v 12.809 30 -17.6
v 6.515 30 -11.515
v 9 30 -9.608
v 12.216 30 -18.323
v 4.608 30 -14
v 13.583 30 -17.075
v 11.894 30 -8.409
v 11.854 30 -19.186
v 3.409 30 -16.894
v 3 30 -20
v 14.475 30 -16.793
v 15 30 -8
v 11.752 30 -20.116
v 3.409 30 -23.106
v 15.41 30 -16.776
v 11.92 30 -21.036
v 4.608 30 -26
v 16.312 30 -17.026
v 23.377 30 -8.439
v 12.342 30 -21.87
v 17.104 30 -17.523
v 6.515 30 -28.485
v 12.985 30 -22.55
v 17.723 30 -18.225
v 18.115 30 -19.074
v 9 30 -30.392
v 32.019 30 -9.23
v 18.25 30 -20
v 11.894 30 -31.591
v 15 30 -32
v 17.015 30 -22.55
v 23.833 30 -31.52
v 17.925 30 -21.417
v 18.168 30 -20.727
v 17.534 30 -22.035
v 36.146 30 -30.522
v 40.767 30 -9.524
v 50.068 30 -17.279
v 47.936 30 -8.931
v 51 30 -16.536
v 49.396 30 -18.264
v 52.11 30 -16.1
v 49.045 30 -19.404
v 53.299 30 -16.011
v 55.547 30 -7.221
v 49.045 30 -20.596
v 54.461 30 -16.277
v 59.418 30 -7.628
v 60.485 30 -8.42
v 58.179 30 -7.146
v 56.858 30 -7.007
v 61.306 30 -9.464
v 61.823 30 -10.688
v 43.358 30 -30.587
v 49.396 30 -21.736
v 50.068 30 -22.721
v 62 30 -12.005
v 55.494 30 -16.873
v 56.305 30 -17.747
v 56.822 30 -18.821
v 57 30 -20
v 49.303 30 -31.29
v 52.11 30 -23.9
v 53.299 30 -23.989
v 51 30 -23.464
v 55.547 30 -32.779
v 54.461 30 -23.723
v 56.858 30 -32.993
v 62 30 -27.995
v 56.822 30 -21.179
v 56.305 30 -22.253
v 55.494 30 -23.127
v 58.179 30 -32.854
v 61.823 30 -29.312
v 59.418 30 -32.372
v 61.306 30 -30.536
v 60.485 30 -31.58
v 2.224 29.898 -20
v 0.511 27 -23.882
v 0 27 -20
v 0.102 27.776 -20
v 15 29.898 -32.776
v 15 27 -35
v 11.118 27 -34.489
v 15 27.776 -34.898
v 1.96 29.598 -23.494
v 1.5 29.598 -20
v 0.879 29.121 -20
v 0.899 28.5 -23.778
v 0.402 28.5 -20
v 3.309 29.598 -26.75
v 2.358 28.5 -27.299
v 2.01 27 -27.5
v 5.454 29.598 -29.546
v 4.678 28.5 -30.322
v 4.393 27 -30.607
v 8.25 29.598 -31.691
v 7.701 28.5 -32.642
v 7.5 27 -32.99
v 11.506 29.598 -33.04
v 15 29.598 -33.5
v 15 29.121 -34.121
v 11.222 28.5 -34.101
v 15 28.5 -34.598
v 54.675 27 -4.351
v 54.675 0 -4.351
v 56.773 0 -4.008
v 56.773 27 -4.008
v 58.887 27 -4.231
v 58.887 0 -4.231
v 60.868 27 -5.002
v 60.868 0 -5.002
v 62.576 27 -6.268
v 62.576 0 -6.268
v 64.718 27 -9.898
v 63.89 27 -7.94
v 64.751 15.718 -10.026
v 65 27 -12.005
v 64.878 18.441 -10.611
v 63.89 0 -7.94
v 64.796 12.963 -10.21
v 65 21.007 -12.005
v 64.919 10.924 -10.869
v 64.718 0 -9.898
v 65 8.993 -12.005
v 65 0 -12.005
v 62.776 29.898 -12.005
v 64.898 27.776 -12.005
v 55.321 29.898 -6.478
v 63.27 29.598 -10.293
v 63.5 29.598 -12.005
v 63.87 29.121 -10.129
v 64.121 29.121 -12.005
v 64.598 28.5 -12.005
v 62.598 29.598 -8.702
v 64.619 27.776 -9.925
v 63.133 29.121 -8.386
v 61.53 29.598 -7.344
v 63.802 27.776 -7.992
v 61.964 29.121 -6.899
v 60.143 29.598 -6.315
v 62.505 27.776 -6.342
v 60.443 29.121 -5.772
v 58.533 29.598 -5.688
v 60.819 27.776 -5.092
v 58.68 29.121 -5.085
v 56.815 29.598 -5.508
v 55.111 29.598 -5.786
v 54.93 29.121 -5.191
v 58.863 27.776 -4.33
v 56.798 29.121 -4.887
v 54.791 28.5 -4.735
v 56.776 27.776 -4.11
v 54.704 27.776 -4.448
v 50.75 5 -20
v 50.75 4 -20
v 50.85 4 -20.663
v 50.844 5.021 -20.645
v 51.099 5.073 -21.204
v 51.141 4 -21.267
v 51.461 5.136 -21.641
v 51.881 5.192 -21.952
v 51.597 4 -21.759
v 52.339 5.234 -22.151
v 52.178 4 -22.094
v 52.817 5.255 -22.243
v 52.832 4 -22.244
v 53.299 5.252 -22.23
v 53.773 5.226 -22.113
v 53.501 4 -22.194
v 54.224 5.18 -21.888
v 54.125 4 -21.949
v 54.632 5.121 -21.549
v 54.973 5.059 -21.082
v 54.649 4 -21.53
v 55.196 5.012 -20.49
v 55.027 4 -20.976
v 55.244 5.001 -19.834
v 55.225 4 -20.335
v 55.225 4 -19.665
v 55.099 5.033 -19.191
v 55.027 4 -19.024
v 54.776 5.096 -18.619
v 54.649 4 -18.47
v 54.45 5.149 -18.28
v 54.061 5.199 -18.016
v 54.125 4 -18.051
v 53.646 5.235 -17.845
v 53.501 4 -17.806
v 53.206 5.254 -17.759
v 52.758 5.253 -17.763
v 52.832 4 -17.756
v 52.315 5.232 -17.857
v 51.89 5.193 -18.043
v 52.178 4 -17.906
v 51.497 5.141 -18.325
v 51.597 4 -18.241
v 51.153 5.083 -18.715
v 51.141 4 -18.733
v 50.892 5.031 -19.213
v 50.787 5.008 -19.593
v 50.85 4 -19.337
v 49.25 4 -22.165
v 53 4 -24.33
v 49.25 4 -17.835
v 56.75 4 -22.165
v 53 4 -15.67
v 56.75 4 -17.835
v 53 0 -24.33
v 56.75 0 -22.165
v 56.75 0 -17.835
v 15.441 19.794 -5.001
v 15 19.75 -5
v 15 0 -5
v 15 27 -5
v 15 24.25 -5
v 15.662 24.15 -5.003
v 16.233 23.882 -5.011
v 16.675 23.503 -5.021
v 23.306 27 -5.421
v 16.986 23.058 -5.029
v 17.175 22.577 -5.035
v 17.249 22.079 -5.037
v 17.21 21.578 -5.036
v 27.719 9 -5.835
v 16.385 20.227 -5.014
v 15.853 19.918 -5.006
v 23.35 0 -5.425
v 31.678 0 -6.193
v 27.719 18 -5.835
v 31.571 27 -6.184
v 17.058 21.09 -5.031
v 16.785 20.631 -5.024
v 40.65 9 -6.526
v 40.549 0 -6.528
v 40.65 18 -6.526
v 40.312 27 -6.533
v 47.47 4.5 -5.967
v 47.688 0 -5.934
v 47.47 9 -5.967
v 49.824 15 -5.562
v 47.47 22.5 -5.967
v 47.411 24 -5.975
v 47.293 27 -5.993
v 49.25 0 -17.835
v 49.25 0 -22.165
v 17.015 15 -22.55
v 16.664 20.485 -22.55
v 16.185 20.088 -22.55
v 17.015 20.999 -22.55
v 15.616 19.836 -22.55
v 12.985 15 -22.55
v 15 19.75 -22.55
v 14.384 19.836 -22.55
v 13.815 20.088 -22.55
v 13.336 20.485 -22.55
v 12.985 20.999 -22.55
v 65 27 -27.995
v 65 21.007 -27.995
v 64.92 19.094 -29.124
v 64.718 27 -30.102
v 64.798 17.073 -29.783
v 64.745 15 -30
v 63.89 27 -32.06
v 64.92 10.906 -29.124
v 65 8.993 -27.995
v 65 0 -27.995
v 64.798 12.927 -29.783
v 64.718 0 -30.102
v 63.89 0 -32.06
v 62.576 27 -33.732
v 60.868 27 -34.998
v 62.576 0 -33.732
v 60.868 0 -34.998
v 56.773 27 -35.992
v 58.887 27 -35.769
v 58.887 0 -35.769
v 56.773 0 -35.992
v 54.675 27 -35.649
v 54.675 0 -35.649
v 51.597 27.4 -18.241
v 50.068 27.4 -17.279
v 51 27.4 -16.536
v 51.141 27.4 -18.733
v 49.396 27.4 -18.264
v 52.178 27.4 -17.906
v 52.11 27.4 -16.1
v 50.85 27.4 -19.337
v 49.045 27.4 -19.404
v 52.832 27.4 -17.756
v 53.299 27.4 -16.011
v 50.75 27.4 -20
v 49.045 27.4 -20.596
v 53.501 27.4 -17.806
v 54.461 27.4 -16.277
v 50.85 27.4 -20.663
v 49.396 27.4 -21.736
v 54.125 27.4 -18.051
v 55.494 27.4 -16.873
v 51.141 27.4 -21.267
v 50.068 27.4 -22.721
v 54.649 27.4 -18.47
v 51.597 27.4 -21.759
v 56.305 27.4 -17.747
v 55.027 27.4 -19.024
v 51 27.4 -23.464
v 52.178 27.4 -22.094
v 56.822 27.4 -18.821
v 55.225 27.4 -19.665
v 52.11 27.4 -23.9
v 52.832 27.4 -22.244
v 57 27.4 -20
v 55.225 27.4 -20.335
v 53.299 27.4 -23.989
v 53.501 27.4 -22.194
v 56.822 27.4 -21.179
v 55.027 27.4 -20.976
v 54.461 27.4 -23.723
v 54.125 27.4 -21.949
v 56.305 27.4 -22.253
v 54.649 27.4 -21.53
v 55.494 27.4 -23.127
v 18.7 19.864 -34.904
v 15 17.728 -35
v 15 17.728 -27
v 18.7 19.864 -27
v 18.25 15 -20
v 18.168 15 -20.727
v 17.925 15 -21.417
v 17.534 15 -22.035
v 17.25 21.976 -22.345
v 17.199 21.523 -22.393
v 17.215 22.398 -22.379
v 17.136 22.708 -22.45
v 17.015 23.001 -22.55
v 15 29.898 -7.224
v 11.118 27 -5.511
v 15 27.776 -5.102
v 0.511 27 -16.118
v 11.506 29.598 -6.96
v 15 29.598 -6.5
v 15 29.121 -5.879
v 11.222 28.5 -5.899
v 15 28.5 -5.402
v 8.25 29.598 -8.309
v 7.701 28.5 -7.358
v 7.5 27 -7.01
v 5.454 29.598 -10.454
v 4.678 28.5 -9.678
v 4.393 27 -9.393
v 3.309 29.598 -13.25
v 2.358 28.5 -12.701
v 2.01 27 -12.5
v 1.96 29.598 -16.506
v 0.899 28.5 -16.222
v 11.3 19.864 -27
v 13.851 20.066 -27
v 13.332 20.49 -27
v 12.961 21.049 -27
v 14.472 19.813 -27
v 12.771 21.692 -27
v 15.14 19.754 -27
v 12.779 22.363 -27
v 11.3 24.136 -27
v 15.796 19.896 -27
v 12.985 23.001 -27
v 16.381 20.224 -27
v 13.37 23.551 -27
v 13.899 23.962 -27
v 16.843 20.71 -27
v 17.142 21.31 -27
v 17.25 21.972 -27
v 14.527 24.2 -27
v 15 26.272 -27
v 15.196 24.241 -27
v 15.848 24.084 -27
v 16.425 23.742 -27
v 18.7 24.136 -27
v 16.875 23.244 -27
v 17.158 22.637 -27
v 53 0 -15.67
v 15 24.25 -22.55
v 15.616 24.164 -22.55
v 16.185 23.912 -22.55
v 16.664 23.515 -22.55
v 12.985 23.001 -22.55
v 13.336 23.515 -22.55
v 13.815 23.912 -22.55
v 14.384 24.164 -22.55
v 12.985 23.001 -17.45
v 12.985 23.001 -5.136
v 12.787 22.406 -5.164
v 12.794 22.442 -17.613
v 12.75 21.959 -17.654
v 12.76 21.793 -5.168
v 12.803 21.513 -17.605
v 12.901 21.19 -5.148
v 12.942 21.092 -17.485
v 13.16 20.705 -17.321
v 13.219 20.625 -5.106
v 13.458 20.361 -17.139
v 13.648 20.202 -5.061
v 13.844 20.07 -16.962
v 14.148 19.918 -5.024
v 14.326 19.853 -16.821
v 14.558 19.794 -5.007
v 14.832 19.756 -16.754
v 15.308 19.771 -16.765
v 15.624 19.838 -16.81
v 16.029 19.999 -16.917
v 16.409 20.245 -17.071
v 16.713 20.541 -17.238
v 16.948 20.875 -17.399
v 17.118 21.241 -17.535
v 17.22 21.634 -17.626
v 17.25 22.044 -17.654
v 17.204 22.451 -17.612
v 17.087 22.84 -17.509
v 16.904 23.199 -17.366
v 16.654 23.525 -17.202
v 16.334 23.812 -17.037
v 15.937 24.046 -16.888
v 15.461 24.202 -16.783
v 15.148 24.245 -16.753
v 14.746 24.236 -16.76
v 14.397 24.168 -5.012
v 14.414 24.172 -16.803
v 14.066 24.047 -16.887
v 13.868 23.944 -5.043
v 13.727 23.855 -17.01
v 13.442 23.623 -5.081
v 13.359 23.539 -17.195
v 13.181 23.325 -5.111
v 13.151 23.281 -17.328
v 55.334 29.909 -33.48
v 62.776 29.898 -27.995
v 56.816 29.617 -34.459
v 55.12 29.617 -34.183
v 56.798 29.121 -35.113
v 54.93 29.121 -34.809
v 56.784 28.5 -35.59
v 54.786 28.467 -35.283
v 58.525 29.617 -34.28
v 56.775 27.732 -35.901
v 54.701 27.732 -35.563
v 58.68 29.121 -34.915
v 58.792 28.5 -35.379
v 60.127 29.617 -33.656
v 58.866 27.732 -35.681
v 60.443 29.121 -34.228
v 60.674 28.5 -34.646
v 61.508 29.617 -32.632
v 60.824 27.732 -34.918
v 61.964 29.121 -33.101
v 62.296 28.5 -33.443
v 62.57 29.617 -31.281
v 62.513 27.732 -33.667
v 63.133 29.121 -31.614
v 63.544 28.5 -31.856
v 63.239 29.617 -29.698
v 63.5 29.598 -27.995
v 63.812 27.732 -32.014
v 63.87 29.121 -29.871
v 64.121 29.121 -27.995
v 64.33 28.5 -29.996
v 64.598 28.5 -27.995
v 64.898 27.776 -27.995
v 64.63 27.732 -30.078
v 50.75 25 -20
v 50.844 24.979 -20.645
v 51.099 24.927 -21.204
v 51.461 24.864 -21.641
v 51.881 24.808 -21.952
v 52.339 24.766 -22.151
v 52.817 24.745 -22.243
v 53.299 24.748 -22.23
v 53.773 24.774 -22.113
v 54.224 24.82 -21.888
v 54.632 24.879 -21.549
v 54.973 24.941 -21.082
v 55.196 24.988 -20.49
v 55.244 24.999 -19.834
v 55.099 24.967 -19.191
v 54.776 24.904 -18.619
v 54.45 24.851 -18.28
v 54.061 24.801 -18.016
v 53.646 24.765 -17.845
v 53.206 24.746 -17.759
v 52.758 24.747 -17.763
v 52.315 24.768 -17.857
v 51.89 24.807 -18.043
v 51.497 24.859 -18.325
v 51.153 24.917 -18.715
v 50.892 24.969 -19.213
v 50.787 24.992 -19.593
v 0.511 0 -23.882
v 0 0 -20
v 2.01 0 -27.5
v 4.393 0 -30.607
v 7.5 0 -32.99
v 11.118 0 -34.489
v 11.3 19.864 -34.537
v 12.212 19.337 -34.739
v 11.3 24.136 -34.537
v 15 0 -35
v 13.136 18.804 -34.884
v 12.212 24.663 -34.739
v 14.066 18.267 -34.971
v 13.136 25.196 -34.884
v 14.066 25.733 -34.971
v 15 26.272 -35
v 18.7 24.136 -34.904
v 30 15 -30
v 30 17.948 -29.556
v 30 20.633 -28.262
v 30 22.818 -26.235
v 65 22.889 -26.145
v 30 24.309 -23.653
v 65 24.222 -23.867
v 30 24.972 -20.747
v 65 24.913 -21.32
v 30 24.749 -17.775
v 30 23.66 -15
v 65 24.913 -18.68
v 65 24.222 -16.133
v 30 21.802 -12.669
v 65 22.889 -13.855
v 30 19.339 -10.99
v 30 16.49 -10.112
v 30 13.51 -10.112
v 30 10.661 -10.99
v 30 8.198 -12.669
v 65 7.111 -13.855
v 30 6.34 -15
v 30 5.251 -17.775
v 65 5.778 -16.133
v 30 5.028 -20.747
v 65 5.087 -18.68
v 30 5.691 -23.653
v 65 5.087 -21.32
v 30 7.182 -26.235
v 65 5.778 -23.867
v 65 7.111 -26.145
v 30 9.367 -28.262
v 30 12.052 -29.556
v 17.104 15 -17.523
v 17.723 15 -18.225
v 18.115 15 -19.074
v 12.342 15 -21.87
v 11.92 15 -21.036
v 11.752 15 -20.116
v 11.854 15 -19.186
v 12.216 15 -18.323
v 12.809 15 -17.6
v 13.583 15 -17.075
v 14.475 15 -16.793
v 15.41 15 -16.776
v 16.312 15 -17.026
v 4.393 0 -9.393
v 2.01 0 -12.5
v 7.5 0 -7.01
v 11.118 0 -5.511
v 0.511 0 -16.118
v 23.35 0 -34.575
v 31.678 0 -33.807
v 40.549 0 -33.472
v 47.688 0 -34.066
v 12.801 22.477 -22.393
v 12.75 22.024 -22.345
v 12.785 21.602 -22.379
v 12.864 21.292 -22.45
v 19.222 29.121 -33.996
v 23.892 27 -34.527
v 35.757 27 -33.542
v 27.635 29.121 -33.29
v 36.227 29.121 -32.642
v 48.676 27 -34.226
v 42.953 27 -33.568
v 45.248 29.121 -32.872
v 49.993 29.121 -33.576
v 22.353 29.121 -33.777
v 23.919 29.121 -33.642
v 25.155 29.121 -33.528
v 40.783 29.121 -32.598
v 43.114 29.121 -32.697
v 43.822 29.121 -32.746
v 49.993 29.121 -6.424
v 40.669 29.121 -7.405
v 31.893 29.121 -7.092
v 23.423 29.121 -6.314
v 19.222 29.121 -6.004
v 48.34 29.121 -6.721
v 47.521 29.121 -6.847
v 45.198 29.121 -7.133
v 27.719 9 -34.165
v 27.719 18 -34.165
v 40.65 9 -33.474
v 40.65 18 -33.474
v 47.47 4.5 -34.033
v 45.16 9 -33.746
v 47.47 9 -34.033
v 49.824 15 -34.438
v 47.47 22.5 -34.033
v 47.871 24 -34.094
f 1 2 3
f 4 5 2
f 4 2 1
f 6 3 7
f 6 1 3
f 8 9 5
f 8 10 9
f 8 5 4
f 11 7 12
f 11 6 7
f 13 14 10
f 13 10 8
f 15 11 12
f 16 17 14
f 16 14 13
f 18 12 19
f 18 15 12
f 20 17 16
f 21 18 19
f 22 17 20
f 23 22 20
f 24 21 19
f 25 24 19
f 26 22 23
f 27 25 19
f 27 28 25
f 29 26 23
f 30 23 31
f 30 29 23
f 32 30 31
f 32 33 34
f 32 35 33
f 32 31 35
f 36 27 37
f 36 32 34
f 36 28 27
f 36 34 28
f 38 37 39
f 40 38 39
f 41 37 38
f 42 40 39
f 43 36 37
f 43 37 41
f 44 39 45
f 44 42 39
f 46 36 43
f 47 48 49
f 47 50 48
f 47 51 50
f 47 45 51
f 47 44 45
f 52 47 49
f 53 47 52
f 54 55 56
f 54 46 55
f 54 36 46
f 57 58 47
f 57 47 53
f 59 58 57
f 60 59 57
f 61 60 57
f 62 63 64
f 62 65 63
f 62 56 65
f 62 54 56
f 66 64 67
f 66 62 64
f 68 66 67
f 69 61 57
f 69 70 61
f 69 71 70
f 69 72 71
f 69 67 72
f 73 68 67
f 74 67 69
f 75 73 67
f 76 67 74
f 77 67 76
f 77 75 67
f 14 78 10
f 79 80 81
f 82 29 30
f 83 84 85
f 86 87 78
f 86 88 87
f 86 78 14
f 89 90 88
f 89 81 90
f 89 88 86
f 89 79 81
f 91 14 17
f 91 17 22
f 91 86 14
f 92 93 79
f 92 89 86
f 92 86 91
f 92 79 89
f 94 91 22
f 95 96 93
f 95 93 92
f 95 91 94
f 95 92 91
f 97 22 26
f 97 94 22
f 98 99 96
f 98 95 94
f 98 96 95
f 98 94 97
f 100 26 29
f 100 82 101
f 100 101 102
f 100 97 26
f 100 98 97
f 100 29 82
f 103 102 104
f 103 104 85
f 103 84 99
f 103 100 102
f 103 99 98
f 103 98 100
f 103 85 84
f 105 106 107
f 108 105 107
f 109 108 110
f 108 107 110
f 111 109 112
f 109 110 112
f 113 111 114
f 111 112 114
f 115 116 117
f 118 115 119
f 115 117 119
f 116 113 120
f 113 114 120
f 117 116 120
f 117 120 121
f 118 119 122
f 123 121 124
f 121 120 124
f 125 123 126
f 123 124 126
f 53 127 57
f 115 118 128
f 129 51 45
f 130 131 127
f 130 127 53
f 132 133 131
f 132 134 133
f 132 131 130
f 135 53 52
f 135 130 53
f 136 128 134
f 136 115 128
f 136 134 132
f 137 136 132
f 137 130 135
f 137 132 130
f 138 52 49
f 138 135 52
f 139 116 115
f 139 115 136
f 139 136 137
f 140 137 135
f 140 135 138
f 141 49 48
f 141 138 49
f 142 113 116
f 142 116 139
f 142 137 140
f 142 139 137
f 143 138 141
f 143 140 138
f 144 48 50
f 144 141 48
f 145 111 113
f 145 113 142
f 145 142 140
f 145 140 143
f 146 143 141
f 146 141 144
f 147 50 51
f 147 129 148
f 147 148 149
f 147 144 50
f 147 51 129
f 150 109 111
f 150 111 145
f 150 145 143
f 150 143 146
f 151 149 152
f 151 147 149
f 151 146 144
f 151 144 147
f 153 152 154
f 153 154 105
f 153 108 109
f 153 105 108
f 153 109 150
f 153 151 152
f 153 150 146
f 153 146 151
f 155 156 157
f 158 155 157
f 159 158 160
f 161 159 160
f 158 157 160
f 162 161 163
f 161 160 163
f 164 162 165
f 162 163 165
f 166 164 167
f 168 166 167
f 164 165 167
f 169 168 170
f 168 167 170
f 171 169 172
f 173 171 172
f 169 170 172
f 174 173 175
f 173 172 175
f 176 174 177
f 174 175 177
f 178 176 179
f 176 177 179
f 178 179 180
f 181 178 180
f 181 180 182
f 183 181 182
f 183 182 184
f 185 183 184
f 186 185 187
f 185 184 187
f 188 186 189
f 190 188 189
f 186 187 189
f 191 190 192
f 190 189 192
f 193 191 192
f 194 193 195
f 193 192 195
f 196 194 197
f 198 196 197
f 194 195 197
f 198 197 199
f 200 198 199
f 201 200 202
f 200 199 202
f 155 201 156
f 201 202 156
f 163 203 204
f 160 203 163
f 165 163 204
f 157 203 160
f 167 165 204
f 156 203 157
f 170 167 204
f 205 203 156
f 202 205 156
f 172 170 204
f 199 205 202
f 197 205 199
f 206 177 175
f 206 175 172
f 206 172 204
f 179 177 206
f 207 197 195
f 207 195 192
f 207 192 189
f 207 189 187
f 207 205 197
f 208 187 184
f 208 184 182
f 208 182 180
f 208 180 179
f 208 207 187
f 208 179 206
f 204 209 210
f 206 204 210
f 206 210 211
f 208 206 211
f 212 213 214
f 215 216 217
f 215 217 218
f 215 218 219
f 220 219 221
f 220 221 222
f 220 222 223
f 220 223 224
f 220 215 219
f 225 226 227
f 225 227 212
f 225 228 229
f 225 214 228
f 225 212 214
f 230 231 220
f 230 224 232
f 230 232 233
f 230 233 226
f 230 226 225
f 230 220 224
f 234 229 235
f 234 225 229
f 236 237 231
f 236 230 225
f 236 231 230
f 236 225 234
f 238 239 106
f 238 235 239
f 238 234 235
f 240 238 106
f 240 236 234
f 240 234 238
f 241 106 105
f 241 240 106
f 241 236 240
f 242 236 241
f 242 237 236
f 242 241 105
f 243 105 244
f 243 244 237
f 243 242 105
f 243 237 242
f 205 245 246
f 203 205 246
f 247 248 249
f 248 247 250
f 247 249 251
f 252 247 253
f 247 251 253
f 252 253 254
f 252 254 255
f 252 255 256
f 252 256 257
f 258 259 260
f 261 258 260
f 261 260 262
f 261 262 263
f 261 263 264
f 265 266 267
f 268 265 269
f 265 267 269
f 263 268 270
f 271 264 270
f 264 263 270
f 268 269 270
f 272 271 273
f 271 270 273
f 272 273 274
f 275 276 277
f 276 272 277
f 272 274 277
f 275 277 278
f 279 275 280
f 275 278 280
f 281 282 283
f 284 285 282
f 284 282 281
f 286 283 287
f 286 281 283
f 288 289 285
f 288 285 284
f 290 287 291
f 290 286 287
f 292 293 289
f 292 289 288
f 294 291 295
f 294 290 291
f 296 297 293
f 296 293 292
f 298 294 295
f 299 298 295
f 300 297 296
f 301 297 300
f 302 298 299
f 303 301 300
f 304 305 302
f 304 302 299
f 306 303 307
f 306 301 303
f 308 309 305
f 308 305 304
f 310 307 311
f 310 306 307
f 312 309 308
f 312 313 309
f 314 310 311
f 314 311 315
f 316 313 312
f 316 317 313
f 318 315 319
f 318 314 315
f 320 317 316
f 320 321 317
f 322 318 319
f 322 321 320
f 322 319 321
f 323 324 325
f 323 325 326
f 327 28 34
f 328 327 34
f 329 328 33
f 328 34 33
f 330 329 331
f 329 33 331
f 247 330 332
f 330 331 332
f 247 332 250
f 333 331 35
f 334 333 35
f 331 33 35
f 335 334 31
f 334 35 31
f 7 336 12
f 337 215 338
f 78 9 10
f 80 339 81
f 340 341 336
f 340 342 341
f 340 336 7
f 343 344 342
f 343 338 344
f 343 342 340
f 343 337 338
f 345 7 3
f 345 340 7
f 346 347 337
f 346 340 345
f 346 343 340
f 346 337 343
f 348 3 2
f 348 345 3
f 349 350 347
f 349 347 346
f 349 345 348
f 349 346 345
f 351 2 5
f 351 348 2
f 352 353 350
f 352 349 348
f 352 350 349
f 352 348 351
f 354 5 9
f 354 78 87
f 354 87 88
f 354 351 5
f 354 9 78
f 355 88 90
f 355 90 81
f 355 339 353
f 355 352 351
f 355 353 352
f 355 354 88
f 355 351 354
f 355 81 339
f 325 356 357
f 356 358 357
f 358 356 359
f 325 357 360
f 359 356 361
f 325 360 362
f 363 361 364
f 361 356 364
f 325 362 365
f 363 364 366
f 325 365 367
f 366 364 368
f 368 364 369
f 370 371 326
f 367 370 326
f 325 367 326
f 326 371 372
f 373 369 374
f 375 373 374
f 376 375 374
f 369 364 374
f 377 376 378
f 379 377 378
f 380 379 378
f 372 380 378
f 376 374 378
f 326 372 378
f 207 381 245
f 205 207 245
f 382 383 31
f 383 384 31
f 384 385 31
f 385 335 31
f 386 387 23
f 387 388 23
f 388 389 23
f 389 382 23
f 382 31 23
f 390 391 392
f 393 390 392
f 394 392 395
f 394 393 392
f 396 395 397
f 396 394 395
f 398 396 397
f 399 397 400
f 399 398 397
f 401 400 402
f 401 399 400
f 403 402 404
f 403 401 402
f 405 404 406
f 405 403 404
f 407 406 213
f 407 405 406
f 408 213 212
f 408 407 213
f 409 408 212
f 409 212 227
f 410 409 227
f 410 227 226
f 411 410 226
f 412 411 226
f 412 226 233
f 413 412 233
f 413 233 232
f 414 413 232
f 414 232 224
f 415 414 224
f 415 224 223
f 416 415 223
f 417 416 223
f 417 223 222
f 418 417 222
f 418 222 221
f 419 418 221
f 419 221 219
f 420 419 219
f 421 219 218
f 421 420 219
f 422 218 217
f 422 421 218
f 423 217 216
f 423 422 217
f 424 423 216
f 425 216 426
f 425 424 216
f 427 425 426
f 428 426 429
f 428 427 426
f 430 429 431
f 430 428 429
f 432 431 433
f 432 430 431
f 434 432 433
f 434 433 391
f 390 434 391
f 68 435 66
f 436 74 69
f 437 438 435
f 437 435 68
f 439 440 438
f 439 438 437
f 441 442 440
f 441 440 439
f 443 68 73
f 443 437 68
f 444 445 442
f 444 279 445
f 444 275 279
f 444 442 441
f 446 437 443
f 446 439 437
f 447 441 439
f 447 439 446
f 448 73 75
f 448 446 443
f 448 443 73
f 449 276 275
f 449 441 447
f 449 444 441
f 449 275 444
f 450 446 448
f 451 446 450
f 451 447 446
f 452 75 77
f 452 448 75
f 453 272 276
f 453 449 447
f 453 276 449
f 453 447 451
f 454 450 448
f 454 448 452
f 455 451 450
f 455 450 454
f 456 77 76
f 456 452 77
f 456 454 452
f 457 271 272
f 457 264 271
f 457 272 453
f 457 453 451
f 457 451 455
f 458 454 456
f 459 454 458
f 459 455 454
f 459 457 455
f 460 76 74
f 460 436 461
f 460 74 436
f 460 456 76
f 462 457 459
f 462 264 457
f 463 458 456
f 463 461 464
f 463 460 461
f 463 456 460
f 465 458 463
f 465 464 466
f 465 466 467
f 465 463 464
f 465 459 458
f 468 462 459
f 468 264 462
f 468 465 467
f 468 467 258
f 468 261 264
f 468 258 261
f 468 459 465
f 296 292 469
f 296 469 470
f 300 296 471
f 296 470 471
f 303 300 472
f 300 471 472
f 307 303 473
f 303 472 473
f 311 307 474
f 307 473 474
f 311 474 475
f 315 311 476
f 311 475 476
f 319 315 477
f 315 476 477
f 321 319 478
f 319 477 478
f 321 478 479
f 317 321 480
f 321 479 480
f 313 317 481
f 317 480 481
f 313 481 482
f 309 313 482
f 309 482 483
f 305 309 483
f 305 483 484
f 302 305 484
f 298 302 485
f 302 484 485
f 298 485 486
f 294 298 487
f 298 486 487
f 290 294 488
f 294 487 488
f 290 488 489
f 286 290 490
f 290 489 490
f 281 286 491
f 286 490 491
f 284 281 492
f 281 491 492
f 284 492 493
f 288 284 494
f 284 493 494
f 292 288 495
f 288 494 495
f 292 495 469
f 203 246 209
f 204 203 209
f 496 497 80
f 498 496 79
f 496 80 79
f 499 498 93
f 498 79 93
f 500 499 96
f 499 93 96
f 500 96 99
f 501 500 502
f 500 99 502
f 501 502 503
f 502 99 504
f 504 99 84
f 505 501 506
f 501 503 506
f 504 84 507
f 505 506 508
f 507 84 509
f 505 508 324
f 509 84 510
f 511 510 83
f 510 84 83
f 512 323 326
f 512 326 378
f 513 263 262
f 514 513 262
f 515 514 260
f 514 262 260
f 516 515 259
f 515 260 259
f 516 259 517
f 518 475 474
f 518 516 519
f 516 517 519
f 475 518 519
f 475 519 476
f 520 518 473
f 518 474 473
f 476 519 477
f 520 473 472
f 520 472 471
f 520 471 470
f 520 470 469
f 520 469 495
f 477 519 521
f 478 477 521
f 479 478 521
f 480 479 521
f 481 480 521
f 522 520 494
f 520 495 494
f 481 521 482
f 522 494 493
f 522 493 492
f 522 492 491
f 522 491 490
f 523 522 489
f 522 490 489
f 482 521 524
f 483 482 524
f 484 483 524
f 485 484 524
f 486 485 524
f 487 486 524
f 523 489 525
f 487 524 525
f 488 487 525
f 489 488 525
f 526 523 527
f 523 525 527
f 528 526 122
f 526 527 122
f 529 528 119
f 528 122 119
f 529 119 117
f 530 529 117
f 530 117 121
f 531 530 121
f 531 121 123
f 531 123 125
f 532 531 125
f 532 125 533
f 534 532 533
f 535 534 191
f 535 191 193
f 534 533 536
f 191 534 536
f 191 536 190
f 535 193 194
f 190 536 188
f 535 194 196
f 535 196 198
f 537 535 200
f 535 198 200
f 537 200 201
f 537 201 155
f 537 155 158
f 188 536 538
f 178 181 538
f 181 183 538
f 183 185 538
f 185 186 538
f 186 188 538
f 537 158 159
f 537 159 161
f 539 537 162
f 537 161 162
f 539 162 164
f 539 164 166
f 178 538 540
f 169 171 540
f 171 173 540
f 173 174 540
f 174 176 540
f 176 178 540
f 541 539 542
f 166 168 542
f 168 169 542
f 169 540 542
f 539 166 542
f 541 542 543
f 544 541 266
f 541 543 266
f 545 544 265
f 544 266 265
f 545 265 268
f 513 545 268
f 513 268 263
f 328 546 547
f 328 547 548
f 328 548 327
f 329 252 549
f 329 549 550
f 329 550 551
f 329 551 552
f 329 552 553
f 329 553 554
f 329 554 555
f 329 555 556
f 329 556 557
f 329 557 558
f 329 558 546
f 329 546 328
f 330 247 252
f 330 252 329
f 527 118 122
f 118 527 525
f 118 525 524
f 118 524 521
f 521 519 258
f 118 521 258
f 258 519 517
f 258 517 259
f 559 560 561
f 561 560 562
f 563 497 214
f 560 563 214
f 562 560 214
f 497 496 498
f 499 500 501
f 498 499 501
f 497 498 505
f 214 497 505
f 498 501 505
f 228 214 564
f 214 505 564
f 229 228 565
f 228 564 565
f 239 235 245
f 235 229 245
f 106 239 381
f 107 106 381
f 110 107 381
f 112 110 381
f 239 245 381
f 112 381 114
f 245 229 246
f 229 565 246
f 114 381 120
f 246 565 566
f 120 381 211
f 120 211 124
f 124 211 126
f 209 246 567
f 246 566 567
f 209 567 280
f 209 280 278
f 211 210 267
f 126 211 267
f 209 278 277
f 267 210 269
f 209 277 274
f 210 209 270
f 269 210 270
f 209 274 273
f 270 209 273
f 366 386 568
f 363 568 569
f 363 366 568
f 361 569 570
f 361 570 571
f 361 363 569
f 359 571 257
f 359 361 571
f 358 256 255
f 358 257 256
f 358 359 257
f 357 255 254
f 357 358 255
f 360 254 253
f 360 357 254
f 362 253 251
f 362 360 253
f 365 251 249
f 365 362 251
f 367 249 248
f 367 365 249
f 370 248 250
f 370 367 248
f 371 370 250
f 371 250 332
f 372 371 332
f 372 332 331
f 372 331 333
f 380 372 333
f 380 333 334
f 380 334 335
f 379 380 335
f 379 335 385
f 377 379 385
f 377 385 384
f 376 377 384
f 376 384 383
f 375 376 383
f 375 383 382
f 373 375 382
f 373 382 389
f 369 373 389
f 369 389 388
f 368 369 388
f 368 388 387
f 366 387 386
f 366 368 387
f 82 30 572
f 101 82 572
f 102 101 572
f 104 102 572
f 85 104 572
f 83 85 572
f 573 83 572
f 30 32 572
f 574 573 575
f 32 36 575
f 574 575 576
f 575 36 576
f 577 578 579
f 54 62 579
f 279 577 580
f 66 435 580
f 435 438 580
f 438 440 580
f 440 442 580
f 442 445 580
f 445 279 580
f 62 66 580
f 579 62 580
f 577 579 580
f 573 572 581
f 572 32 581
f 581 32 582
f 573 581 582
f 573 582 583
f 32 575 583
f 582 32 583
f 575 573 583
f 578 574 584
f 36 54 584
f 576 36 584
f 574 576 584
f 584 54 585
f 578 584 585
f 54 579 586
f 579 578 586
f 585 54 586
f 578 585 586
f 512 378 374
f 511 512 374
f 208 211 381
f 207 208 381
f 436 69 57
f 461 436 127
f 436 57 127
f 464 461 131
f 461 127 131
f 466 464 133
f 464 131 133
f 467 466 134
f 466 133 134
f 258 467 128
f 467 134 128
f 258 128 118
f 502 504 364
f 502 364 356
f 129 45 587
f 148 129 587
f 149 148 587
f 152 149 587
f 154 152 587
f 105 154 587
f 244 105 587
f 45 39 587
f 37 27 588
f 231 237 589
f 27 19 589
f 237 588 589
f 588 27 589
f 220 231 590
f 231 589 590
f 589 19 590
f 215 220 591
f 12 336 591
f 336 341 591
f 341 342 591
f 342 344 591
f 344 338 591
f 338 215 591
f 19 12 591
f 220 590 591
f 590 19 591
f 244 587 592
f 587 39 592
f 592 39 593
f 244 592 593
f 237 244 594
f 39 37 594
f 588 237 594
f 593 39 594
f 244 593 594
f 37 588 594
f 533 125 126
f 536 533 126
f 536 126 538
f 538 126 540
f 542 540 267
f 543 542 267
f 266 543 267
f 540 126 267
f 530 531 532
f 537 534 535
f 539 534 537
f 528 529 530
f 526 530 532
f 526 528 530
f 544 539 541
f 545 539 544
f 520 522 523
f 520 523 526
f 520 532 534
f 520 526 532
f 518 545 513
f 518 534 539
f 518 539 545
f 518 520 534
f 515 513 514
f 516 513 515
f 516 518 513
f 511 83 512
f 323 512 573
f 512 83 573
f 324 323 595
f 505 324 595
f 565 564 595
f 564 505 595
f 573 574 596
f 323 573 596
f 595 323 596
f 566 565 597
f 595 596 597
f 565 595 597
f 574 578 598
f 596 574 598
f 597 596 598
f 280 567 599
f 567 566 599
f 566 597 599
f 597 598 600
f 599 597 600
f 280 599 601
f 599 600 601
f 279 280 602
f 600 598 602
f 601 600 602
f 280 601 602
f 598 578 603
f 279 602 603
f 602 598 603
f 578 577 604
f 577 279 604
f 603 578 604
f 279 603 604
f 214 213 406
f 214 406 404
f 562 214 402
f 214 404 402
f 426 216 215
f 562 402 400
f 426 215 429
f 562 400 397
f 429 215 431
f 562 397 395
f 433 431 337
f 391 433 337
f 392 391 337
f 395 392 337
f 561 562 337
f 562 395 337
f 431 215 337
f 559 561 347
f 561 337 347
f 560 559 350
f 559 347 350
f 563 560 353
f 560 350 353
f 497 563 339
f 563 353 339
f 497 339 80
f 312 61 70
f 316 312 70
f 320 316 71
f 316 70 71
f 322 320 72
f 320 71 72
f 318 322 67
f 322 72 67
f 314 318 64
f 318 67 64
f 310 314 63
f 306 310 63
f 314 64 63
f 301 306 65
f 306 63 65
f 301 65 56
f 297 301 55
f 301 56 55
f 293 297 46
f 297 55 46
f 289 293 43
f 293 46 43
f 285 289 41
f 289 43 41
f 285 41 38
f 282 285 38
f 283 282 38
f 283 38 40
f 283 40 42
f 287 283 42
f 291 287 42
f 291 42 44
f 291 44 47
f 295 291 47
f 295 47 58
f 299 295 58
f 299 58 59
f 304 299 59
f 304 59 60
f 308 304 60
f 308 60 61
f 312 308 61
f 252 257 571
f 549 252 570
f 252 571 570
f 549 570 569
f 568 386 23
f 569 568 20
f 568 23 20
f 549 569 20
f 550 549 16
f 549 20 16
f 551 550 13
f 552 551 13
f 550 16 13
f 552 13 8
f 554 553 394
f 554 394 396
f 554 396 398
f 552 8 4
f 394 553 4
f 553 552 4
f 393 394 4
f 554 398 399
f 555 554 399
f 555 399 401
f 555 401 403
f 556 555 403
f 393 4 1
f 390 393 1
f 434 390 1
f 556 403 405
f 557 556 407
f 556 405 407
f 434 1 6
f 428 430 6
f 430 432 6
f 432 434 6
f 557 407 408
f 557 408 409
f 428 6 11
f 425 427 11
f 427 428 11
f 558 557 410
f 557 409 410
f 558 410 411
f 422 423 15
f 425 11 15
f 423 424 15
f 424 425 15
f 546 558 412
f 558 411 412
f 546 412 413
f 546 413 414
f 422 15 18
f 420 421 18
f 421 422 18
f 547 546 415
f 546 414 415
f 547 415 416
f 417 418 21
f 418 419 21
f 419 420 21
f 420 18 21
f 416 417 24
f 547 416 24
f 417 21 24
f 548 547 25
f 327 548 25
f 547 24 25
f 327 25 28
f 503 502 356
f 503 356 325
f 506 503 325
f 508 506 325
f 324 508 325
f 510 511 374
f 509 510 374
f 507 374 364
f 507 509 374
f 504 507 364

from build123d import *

# Parameters (mm, degrees)
SKETCH1_W                                   = 65
SKETCH1_H                                   = 40
BOSS_EXTRUDE1_DEPTH                         = 30
SKETCH3_R                                   = 10
CUT_EXTRUDE2_DEPTH                          = 35
CBORE_FOR_M4_CHEESE_HEAD_SCREW1_D           = 4.5
CBORE_FOR_M4_CHEESE_HEAD_SCREW1_CBORE_D     = 8
CBORE_FOR_M4_CHEESE_HEAD_SCREW1_CBORE_DEPTH = 2.6
SKETCH10_R                                  = 2.25
CUT_EXTRUDE8_DEPTH                          = 4
CUT_EXTRUDE9_DEPTH                          = 15
CUT_EXTRUDE10_DEPTH                         = 83.006097414
FILLET9_R                                   = 8
SKETCH12_R                                  = 2.25
CUT_EXTRUDE11_DEPTH                         = 8
SKETCH12_3_R                                = 2.25
CUT_EXTRUDE12_DEPTH                         = 79.010807554
FILLET10_R                                  = 3


with BuildPart() as part:
    # Sketch1 → Boss-Extrude1 (new body)
    with BuildSketch(Plane(origin=(0, 0, 0), x_dir=(1, 0, 0), z_dir=(0, 1, 0))):
        with Locations((32.5, 20)):
            Rectangle(SKETCH1_W, SKETCH1_H)
    extrude(amount=BOSS_EXTRUDE1_DEPTH)

    # Sketch3 → Cut-Extrude2 (cut)
    with BuildSketch(Plane(origin=(65, 0, 0), x_dir=(0, 0, -1), z_dir=(1, 0, 0))):
        with Locations((20, 15)):
            Circle(SKETCH3_R)
    extrude(amount=-CUT_EXTRUDE2_DEPTH, mode=Mode.SUBTRACT)

    # CBORE for M4 Cheese Head Screw1 (through all)
    with Locations(Plane(origin=(0, 30, 0), x_dir=(1, 0, 0), z_dir=(0, 1, 0))):
        with Locations((53, 20)):
            CounterBoreHole(CBORE_FOR_M4_CHEESE_HEAD_SCREW1_D / 2, CBORE_FOR_M4_CHEESE_HEAD_SCREW1_CBORE_D / 2, CBORE_FOR_M4_CHEESE_HEAD_SCREW1_CBORE_DEPTH)

    # Sketch10 → Cut-Extrude8 (cut)
    with BuildSketch(Plane.XZ):
        Polygon((53, -15.669872981), (49.25, -17.834936491), (49.25, -22.165063509), (53, -24.330127019), (56.75, -22.165063509), (56.75, -17.834936491), align=None)
        with Locations(Location((53, -20, 0), (0, 0, 90))):
            Circle(SKETCH10_R, mode=Mode.SUBTRACT)
    extrude(amount=-CUT_EXTRUDE8_DEPTH, mode=Mode.SUBTRACT)

    # Sketch2 → Cut-Extrude9 (cut)
    with BuildSketch(Plane(origin=(0, 30, 0), x_dir=(1, 0, 0), z_dir=(0, 1, 0))):
        with BuildLine():
            Line((17.014944168, 22.55), (12.985055832, 22.55))
            ThreePointArc((12.985055832, 22.55), (13.583325822, 17.075015509), (18.25, 20))
            ThreePointArc((18.25, 20), (17.924984491, 21.416674178), (17.014944168, 22.55))
        make_face()
    extrude(amount=-CUT_EXTRUDE9_DEPTH, mode=Mode.SUBTRACT)

    # Sketch2<7> → Cut-Extrude10 (cut, through all)
    with BuildSketch(Plane(origin=(0, 30, 0), x_dir=(1, 0, 0), z_dir=(0, 1, 0))):
        with BuildLine():
            Line((65, 40), (0, 40))
            Line((0, 40), (0, 19.999999921))
            ThreePointArc((0, 19.999999921), (4.393398254, 30.60660169), (15, 35))
            add(Edge.make_bspline(
                [(15, 35), (30.758528256, 35), (45.015961289, 29.236867717), (65, 40)],
                knots=[0, 0, 0, 0, 1, 1, 1, 1], degree=3))
        make_face()
        with BuildLine():
            ThreePointArc((15, 5), (4.39339831, 9.393398254), (0, 19.999999921))
            Line((0, 19.999999921), (0, 0))
            Line((0, 0), (65, 0))
            add(Edge.make_bspline(
                [(15, 5), (30.758528256, 5), (45.015961289, 10.763132283), (65, 0)],
                knots=[0, 0, 0, 0, 1, 1, 1, 1], degree=3))
        make_face()
    extrude(amount=-CUT_EXTRUDE10_DEPTH, mode=Mode.SUBTRACT)

    # Fillet9
    # the kernel refuses this fillet: 8 mm, written as the material it takes off along each edge
    with BuildSketch(Plane(origin=(65, 0, -40), x_dir=(0, 0, 1), z_dir=(0, 1, 0))) as fillet9_piece_1:
        with BuildLine():
            CenterArc((12.0050638, -8), FILLET9_R, 90, 106.898701243)
            Line((4.350502414, -10.325444039), (4.197411186, -10.37195292))
            ThreePointArc((4.197411186, -10.37195292), (2.285588644, -5.115947892), (-0.140868031, -0.075869611))
            Line((-0.140868031, -0.075869611), (0, 0.16))
            Line((0, 0.16), (12.0050638, 0.16))
            Line((12.0050638, 0.16), (12.0050638, 0))
        make_face()
    extrude(amount=30, mode=Mode.SUBTRACT)
    with BuildSketch(Plane(origin=(65, 0, 0), x_dir=(0, 0, -1), z_dir=(0, 1, 0))) as fillet9_piece_2:
        with BuildLine():
            CenterArc((12.0050638, 8), FILLET9_R, 163.101298757, 106.898701243)
            Line((4.350502414, 10.325444039), (4.197411186, 10.37195292))
            ThreePointArc((4.197411186, 10.37195292), (2.285588644, 5.115947892), (-0.140868031, 0.075869611))
            Line((-0.140868031, 0.075869611), (0, -0.16))
            Line((0, -0.16), (12.0050638, -0.16))
            Line((12.0050638, -0.16), (12.0050638, 0))
        make_face()
    extrude(amount=30, mode=Mode.SUBTRACT)

    # Sketch12 → Cut-Extrude11 (cut)
    # profile 1 of 2: a face of its own
    with BuildSketch(Plane.XY.offset(-35)):
        Polygon((15, 17.727608008), (18.7, 19.863804004), (18.7, 24.136195996), (15, 26.272391992), (11.3, 24.136195996), (11.3, 19.863804004), align=None)
        with Locations((15, 22)):
            Circle(SKETCH12_R, mode=Mode.SUBTRACT)
    # profile 2 of 2: a face of its own
    with BuildSketch(Plane.XY.offset(-35)):
        with Locations((15, 22)):
            Circle(SKETCH12_R)
    extrude(amount=CUT_EXTRUDE11_DEPTH, mode=Mode.SUBTRACT)

    # Sketch12<3> → Cut-Extrude12 (cut, through all)
    with BuildSketch(Plane.XY.offset(-35)):
        with Locations(Location((15, 22, 0), (0, 0, 153.576683422))):
            Circle(SKETCH12_3_R)
    extrude(amount=CUT_EXTRUDE12_DEPTH, mode=Mode.SUBTRACT)

    # Fillet10
    fillet10_edges = [part.edges().sort_by_distance(p)[0] for p in [
        (0, 30, -20),
        (34.916790613, 30, -33.583596944),
        (34.916790613, 30, -6.416403056),
        (65, 30, -20),
        (61.7642653, 30, -34.421581993),
        (61.7642653, 30, -5.578418007),
    ]]
    fillet(fillet10_edges, radius=FILLET10_R)


solid = part.part
